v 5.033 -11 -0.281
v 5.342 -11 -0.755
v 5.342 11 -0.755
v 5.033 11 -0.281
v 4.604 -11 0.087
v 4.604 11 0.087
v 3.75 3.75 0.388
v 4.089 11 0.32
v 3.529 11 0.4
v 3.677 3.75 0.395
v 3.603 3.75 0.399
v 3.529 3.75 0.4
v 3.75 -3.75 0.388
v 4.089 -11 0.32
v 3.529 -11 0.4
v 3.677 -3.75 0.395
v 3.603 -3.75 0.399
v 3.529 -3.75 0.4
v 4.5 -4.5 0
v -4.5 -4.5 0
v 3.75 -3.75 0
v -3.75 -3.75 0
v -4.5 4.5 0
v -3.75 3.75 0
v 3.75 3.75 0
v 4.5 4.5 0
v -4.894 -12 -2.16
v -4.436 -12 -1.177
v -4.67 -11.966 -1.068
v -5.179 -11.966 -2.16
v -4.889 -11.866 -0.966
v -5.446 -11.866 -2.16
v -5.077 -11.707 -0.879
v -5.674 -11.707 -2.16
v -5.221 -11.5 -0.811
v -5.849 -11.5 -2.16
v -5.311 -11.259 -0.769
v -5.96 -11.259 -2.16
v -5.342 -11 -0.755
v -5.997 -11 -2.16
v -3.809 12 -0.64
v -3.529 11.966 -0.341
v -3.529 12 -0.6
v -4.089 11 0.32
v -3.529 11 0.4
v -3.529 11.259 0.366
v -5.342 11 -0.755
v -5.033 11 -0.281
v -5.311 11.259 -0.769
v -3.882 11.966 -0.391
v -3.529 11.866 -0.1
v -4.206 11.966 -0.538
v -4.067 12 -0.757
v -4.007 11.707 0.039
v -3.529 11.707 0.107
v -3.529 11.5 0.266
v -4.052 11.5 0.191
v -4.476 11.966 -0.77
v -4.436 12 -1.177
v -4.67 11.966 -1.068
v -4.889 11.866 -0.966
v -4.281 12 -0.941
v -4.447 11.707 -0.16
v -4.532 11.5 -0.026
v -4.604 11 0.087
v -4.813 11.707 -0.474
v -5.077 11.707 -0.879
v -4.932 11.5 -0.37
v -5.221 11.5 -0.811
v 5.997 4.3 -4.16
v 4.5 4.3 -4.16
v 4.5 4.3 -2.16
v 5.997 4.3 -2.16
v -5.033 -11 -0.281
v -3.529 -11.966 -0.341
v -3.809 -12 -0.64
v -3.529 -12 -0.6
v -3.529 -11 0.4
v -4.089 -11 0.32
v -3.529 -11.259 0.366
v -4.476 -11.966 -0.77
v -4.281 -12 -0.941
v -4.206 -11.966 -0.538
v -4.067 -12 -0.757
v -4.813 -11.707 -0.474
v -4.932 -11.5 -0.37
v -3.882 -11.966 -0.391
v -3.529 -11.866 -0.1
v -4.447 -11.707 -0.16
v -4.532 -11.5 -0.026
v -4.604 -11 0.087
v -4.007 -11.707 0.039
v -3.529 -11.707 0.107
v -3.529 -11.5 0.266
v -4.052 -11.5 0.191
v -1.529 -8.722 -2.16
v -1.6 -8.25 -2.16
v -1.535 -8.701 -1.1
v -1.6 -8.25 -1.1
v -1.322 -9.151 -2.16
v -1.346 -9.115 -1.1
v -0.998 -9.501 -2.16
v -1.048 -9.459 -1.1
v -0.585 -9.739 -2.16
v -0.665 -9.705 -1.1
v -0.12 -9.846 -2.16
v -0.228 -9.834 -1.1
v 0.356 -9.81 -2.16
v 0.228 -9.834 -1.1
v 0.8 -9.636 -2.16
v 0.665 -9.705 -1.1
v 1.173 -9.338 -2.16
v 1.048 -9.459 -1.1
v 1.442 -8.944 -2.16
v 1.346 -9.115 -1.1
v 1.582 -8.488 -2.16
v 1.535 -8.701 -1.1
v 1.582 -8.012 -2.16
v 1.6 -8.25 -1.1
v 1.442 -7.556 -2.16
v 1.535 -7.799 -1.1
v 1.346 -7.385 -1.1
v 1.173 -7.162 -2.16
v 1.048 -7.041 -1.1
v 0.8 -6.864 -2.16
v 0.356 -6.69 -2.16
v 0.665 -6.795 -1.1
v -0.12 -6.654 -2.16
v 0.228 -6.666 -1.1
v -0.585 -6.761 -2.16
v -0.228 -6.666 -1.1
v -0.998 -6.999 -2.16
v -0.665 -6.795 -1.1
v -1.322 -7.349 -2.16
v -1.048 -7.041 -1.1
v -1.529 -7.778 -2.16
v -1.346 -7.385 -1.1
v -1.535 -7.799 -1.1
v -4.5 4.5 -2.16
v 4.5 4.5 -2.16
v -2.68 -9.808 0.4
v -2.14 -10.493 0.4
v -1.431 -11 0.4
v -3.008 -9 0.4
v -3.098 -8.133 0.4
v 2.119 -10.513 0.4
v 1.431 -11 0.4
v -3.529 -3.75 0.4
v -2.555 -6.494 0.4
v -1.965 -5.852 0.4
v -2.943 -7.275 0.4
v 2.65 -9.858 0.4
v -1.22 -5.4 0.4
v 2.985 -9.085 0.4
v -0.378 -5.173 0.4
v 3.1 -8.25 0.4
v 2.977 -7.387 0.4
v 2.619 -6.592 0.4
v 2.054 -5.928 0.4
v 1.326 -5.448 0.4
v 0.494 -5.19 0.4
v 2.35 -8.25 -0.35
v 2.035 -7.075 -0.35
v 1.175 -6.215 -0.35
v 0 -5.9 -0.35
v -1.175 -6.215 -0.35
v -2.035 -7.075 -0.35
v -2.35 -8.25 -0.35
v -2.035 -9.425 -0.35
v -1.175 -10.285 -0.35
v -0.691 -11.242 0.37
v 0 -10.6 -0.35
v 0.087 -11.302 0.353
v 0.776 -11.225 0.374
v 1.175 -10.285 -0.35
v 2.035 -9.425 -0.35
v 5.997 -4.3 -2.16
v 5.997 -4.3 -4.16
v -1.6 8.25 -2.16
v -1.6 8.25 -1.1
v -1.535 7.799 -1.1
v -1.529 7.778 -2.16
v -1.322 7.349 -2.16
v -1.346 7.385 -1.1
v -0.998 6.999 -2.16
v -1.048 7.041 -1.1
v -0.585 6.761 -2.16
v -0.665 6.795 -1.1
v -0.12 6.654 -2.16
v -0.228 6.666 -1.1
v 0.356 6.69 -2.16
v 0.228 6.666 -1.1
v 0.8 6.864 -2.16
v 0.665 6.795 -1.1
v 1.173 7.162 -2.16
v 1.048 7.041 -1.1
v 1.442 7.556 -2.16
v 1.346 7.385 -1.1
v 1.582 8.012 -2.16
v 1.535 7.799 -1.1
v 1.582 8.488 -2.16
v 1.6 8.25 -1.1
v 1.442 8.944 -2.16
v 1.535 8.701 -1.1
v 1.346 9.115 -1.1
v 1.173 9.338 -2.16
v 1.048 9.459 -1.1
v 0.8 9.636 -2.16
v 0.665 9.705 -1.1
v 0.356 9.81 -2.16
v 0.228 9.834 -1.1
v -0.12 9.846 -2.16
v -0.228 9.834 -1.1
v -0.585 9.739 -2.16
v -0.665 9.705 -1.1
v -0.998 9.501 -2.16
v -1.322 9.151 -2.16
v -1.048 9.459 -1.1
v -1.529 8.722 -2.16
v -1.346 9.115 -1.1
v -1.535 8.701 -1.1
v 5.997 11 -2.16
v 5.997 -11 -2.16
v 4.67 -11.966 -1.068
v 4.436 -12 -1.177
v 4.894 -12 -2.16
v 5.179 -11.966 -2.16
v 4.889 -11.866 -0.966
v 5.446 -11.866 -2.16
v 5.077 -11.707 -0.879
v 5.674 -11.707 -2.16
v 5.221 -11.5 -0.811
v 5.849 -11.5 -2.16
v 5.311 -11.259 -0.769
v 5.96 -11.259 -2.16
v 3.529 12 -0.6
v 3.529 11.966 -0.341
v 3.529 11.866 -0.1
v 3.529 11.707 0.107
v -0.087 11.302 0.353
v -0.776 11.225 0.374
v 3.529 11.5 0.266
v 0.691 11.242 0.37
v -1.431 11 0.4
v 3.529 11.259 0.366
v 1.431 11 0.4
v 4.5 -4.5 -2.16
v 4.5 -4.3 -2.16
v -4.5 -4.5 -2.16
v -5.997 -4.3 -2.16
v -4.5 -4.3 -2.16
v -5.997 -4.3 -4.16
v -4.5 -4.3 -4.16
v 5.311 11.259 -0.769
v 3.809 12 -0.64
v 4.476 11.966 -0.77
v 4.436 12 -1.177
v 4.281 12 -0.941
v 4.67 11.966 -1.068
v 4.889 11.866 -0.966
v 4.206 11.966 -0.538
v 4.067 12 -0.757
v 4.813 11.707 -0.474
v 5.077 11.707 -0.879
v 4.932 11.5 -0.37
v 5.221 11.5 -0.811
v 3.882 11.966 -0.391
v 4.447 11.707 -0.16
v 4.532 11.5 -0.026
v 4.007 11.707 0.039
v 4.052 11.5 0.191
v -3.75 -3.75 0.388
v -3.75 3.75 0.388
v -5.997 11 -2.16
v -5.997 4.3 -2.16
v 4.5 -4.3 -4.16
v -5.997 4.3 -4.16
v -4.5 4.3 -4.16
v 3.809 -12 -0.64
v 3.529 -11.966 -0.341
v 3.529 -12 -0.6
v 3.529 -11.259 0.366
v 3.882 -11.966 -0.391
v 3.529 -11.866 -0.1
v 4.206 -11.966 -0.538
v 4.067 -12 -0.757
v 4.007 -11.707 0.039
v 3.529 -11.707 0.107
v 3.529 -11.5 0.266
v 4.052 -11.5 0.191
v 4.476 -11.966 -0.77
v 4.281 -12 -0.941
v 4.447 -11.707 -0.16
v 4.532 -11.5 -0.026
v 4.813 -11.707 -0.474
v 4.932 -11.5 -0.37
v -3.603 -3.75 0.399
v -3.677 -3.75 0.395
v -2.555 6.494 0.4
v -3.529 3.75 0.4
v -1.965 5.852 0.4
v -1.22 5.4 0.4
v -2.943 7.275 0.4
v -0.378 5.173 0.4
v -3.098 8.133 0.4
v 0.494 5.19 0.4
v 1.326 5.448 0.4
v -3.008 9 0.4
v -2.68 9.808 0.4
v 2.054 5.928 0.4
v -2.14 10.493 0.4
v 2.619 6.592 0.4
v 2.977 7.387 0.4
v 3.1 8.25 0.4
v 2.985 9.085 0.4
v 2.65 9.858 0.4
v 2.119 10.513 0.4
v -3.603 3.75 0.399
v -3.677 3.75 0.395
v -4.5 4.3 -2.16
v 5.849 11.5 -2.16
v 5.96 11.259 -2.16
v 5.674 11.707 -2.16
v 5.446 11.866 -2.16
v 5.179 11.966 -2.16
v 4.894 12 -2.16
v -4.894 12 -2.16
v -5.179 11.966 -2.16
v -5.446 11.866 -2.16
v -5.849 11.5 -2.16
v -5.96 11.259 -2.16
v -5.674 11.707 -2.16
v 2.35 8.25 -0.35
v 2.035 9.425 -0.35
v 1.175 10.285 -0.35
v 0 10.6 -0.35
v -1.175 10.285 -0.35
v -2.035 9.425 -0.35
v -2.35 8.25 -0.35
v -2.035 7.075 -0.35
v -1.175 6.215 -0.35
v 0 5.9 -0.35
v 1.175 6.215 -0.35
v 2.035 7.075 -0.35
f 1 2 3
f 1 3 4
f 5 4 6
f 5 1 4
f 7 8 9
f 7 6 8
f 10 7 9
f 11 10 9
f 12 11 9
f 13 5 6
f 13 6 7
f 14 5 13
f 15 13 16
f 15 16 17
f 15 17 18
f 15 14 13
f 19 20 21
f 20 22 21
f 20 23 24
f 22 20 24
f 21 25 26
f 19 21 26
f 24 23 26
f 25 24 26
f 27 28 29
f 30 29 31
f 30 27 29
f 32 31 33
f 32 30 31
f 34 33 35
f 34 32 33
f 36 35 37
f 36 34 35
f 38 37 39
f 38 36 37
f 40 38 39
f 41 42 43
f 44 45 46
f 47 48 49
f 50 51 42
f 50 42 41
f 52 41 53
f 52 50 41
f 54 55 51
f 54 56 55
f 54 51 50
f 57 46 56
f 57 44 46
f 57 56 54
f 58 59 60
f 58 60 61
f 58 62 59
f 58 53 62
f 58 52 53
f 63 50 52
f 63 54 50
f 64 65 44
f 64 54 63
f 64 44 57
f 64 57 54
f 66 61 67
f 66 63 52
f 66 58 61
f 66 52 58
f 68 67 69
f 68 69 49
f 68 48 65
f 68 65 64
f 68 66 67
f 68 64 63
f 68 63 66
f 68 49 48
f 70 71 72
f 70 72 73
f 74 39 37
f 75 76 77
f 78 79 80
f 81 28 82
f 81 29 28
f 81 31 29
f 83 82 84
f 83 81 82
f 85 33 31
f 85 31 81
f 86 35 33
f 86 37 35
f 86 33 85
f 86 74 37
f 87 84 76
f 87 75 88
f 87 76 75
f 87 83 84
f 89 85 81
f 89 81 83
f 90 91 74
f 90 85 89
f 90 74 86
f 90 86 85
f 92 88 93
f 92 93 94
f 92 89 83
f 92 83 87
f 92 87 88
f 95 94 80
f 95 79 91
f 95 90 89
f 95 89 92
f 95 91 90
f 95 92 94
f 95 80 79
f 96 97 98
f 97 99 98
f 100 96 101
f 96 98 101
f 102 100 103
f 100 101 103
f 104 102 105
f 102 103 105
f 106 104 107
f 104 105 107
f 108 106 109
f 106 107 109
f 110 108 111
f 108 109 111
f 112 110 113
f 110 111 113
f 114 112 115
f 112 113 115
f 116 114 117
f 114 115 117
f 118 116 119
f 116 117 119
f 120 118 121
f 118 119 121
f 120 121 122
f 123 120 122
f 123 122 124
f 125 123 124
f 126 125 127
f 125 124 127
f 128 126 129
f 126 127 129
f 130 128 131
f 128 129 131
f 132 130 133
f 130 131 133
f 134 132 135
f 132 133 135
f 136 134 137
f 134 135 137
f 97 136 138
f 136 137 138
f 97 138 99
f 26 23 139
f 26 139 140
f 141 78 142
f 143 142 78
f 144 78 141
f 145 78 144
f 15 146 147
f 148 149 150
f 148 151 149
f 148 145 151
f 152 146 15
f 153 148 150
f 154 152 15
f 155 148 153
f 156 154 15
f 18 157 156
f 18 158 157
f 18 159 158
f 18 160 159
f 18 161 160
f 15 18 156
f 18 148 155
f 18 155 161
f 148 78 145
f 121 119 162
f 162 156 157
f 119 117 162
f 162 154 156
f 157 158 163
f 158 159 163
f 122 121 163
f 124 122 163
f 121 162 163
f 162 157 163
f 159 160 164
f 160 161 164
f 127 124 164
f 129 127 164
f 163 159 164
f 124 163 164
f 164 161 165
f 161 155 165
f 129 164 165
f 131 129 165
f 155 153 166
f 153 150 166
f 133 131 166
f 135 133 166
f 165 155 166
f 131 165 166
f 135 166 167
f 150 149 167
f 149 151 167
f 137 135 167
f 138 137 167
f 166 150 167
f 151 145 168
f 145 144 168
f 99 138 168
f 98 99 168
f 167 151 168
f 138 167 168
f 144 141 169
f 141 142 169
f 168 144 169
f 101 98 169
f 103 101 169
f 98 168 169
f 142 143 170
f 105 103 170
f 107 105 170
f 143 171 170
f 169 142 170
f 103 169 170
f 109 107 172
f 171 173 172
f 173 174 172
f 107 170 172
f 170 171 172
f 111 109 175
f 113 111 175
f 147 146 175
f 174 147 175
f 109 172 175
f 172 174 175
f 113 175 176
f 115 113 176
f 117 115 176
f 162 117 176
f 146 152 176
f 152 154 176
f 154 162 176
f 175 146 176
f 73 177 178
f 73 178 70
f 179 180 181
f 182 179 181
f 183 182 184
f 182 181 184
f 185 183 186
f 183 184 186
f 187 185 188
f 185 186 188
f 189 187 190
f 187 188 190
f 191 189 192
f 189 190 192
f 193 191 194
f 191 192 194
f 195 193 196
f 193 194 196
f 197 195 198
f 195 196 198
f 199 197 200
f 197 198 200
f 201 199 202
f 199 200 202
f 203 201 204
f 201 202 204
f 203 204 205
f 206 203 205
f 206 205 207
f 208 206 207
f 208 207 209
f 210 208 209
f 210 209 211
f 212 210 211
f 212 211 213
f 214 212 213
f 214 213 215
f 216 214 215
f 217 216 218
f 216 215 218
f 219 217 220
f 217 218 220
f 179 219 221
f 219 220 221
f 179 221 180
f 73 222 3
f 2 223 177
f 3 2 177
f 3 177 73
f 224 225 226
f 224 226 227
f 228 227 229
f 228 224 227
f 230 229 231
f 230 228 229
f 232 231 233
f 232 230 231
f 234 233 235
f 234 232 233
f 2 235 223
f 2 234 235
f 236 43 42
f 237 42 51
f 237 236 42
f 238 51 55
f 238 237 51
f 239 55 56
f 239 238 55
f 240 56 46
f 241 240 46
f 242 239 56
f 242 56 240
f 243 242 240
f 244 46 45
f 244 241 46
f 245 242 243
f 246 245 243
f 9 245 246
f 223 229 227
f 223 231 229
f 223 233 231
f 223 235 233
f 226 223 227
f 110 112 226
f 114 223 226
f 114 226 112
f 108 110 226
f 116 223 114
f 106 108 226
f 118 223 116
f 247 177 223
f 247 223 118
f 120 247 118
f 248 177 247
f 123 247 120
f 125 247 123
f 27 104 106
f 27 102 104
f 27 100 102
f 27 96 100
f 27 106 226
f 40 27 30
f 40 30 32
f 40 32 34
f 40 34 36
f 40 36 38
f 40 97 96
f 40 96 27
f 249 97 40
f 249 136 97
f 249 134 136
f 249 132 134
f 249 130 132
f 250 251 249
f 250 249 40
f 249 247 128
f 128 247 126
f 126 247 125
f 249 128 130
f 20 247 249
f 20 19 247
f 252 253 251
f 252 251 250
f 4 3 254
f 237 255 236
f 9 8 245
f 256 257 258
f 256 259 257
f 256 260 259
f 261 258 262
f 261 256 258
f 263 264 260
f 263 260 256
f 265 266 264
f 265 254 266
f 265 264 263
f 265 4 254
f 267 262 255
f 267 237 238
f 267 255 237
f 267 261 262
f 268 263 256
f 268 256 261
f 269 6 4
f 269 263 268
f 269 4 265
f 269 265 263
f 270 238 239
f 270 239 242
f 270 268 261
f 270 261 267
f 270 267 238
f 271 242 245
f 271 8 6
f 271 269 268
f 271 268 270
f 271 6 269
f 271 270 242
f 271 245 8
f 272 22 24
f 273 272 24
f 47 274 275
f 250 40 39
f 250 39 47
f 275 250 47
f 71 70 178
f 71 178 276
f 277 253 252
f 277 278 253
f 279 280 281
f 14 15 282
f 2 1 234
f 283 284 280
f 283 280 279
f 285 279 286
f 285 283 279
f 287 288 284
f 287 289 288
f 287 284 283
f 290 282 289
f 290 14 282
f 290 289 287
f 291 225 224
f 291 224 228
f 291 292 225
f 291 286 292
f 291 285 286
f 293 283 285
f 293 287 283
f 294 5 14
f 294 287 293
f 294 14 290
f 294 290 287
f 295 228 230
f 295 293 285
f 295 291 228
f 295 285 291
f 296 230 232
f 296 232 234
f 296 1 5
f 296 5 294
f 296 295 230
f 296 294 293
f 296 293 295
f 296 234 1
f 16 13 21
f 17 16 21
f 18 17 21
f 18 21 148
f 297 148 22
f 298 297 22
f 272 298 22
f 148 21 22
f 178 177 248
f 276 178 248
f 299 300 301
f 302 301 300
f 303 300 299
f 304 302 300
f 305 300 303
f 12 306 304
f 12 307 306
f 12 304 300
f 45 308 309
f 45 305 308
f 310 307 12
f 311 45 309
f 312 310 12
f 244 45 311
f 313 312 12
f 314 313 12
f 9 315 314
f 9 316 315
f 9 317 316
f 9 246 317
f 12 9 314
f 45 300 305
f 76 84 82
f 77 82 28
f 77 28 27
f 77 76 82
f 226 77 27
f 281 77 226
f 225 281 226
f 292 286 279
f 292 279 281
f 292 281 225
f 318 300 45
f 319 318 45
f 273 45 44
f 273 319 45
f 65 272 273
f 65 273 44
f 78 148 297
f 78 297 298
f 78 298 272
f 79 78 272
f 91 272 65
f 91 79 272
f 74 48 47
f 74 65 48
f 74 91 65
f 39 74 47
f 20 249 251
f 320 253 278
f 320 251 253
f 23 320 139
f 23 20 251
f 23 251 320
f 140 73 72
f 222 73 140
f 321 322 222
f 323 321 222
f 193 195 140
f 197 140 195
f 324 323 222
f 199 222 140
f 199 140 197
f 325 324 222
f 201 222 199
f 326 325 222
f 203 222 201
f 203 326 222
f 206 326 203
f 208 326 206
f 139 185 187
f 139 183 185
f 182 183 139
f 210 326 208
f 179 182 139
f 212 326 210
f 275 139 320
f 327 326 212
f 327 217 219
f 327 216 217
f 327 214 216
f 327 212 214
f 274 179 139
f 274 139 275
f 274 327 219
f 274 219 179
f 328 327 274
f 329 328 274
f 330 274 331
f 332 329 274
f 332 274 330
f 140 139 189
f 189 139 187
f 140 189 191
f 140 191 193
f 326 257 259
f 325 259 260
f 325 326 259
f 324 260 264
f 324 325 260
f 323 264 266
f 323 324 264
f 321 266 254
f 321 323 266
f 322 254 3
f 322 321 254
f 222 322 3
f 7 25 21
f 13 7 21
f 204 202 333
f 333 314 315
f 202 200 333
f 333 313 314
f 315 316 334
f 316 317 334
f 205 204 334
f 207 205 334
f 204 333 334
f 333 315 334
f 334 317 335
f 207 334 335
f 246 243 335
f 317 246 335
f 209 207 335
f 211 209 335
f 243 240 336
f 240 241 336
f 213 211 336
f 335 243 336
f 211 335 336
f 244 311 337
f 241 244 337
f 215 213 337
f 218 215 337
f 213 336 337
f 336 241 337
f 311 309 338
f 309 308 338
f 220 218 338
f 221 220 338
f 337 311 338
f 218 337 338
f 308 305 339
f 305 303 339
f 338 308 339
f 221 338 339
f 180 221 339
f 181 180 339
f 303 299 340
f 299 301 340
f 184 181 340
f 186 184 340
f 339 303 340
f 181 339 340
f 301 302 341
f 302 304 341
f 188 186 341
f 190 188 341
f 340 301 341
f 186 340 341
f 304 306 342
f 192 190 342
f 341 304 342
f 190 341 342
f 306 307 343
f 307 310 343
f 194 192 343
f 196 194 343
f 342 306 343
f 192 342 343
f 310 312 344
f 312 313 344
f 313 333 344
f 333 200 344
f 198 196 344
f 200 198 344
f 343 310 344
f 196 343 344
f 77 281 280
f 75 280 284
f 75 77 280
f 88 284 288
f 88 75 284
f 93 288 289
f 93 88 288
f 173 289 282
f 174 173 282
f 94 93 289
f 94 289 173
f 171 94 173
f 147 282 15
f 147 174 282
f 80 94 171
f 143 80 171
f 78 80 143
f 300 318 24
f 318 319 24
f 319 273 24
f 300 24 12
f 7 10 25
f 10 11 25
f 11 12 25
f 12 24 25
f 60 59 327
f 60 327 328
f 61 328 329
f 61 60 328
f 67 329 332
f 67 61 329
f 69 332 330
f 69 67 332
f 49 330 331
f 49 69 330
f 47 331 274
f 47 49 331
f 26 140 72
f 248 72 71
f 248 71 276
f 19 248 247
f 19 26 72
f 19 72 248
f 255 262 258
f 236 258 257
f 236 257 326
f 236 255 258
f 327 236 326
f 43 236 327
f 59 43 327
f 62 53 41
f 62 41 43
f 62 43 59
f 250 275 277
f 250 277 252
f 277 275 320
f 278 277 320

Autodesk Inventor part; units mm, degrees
ref_plane "YZ Plane" through (0, 0, 0) normal (1, 0, 0) x (0, 1, 0)
ref_plane "XZ Plane" through (0, 0, 0) normal (0, 1, 0) x (-1, 0, 0)
sketch "Эскиз1" plane through (0, 0, 0) normal (0, 0, 1) x (1, 0, 0)
  line L0 (-4.25, 4.25) -> (4.25, 4.25) projected
  line L1 (4.25, 4.25) -> (4.25, -4.25) projected
  line L2 (4.25, -4.25) -> (-4.25, -4.25) projected
  line L3 (-4.25, -4.25) -> (-4.25, 4.25) projected
  line L4 (7, -7) -> (7, 7) projected
  line L5 (-7, 7) -> (-7, 4.25) projected
  line L6 (-7, 4.25) -> (-11, 4.25) projected
  line L7 (-11, 4.25) -> (-11, -4.25) projected
  line L8 (-11, -4.25) -> (-7, -4.25) projected
  line L9 (-7, -4.25) -> (-7, -7) projected
  line L10 (-3.75, 3.75) -> (3.75, 3.75)
  line L11 (3.75, 3.75) -> (3.75, -3.75)
  line L12 (3.75, -3.75) -> (-3.75, -3.75)
  line L13 (-3.75, -3.75) -> (-3.75, 3.75)
  line L14 (5.9972, -12) -> (5.9972, -7.2) projected
  line L15 (-5.9972, -7.2) -> (-5.9972, -12) projected
  line L16 (5.9972, -12) -> (-5.9972, -12) projected
  line L17 (5.9972, 7.2) -> (5.9972, 12) projected
  line L18 (-5.9972, 12) -> (5.9972, 12) projected
  line L19 (-5.9972, 12) -> (-5.9972, 7.2) projected
  line L20 (-5.9972, -12) -> (5.9972, -12)
  line L21 (5.9972, -12) -> (5.9972, 12)
  line L22 (5.9972, 12) -> (-5.9972, 12)
  line L23 (-5.9972, 12) -> (-5.9972, -12)
  circle A0 centre (0, -8.25) radius 1.6 projected
  circle A1 centre (0, 8.25) radius 1.6 projected
  point P0 (0, 0)
  dimension "d0" = 0.5
extrude "Выдавливание1" add sketch "Эскиз1" along normal blind 0.4 contours L0 L1 L2 L3 | L16 L15 L23 L19 L18 L17 L21 L14
sketch "Эскиз3" plane through (0, 0, 0) normal (0, 0, -1) x (-1, 0, 0)
  line L0 (-5.9972, 12) -> (5.9972, 12) projected
  line L1 (-5.9972, -12) -> (-5.9972, 12) projected
  line L2 (5.9972, -12) -> (-5.9972, -12) projected
  line L3 (5.9972, 12) -> (5.9972, -12) projected
  line L4 (3.75, 3.75) -> (-3.75, 3.75) projected
  line L5 (3.75, -3.75) -> (3.75, 3.75) projected
  line L6 (-3.75, -3.75) -> (3.75, -3.75) projected
  line L7 (-3.75, 3.75) -> (-3.75, -3.75) projected
  line L8 (-4.25, 4.25) -> (4.25, 4.25)
  line L9 (4.25, 4.25) -> (4.25, -4.25)
  line L10 (4.25, -4.25) -> (-4.25, -4.25)
  line L11 (-4.25, -4.25) -> (-4.25, 4.25)
  line L12 (4.5, 4.5) -> (-4.5, 4.5)
  line L13 (-4.5, 4.5) -> (-4.5, -4.5)
  line L14 (-4.5, -4.5) -> (4.5, -4.5)
  line L15 (4.5, -4.5) -> (4.5, 4.5)
  circle A0 centre (0, -8.25) radius 1.6 projected
  circle A1 centre (0, 8.25) radius 1.6 projected
  point P0 (0, 0)
  dimension "d6" = 0.5
  dimension "d7" = 0.25
ref_plane "РабПлоскость2" through (-5.9972, 7.2, -2.1597) normal (0, 0, 1) x (1, 0, 0)
extrude "Выдавливание3" add sketch "Эскиз3" along normal up to surface (2.1597 mm away) contours L0 L3 L2 L1
sketch "Эскиз5" plane through (5.9972, -12, -2.1597) normal (0, 0, -1) x (-1, 0, 0)
  line L0 (-1.6742, 4.8) -> (-1.6742, 19.2) projected
  line L1 (-1.6742, 19.2) -> (13.6686, 19.2) projected
  line L2 (13.6686, 19.2) -> (13.6686, 4.8) projected
  line L3 (13.6686, 4.8) -> (-1.6742, 4.8) projected
  line L4 (13.4686, 19) -> (-1.4742, 19)
  line L5 (-1.4742, 19) -> (-1.4742, 5)
  line L6 (-1.4742, 5) -> (13.4686, 5)
  line L7 (13.4686, 5) -> (13.4686, 19)
  line L8 (1.4972, 16.5) -> (10.4972, 16.5) projected
  line L9 (10.4972, 16.5) -> (10.4972, 7.5) projected
  line L10 (10.4972, 7.5) -> (1.4972, 7.5) projected
  line L11 (1.4972, 7.5) -> (1.4972, 16.5) projected
  line L12 (0, 24) -> (0, 0) projected
  line L13 (0, 0) -> (11.9944, 0) projected
  line L14 (11.9944, 0) -> (11.9944, 24) projected
  line L15 (11.9944, 24) -> (0, 24) projected
  line L16 (0, 7.5) -> (11.9944, 7.5) projected
  line L17 (11.9944, 16.5) -> (0, 16.5) projected
  line L18 (0, 7.7) -> (11.9944, 7.7)
  line L19 (11.9944, 16.3) -> (0, 16.3)
  point P0 (5.9972, 12)
  point P1 (11.9944, 5)
  point P2 (11.9944, 19)
  point P3 (0, 19)
  point P4 (0, 5)
  point P5 (10.4972, 16.3)
  point P6 (10.4972, 7.7)
  point P7 (11.9944, 7.7)
  point P8 (1.4972, 16.3)
  point P9 (0, 16.3)
  point P10 (0, 7.7)
  point P11 (1.4972, 7.7)
  dimension "d13" = 0.2
  dimension "d20" = 0.2
  dimension "d21" = 0.2
extrude "Выдавливание5" add sketch "Эскиз5" along normal blind 2 contours L12 L19 L11 L18 | L18 L9 L19 L14
sketch "Эскиз6" plane through (-5.9972, -12, 0.4) normal (0, -1, 0) x (1, 0, 0)
  line L0 (13.5091, -5.808) -> (11.9944, -2.5597) projected
  line L1 (11.9944, -2.5597) -> (0, -2.5597) projected
  line L2 (0, -2.5597) -> (-1.5147, -5.808) projected
  arc A0 (-1.5147, -5.808) -> (13.5091, -5.808) centre (5.9972, 3.55) ccw projected
  line L3 (0, -2.5597) -> (11.9944, -2.5597) projected
  line L4 (0, -2.5597) -> (1.1936, 0)
  line L5 (0, 0) -> (11.9944, 0) projected
  line L6 (11.9944, -2.5597) -> (11.9944, 0) projected
  line L7 (11.9944, -2.5597) -> (10.8008, 0)
  line L8 (13.4686, -2.5597) -> (11.9944, -2.5597) projected
  line L9 (6.996, -2.5597) -> (11.9944, -2.5597) projected
  line L10 (0, -2.5597) -> (-1.4742, -2.5597) projected
  line L11 (-1.4742, -2.5597) -> (-1.4742, -4.5597) projected
  line L12 (13.4686, -4.5597) -> (-1.4742, -4.5597) projected
  line L13 (13.4686, -2.5597) -> (13.4686, -4.5597) projected
  line L14 (11.9944, -2.5597) -> (11.9944, 0) projected
  line L15 (0, 0) -> (11.9944, 0) projected
  line L16 (0, -2.5597) -> (0, 0) projected
  line L17 (11.9944, -2.5597) -> (0, -2.5597) projected
  line L18 (6.996, -2.5597) -> (4.9985, -2.5597) projected
  line L19 (0, -2.5597) -> (4.9985, -2.5597) projected
  point P0 (5.9972, -0.4)
  point P1 (11.9944, -2.5597)
  point P2 (11.9944, -2.5597)
  point P3 (12.927, -4.5597)
  point P4 (-0.9326, -4.5597)
  point P5 (0, -2.5597)
  point P6 (0, -2.5597)
  point P7 (0, -2.5597)
  point P8 (0, -2.5597)
extrude "Выдавливание6" cut sketch "Эскиз6" against normal up to surface (24 mm away) contours L0 L8 L13 L12 | L7 L5 L6 | L12 L11 L10 L2 | L16 L5 L4
fillet "Сопряжение2" radius 2 2 edges at (-4.8036, 0, 0.4) (4.8036, 0, 0.4)
fillet "Сопряжение3" radius 1 10 edges at (0, -12, 0.4) (4.6041, -12, 0.0868) (5.6696, -12, -1.4572) (-5.6696, -12, -1.4572) (-4.6041, -12, 0.0868) (-5.6696, 12, -1.4572) (0, 12, 0.4) (4.6041, 12, 0.0868) (5.6696, 12, -1.4572) (-4.6041, 12, 0.0868)
chamfer "Фаска1" distance 1.5 angle 45 2 edges at (-1.6, -8.25, 0.4) (-1.6, 8.25, 0.4)
properties part number "camera_cup"
